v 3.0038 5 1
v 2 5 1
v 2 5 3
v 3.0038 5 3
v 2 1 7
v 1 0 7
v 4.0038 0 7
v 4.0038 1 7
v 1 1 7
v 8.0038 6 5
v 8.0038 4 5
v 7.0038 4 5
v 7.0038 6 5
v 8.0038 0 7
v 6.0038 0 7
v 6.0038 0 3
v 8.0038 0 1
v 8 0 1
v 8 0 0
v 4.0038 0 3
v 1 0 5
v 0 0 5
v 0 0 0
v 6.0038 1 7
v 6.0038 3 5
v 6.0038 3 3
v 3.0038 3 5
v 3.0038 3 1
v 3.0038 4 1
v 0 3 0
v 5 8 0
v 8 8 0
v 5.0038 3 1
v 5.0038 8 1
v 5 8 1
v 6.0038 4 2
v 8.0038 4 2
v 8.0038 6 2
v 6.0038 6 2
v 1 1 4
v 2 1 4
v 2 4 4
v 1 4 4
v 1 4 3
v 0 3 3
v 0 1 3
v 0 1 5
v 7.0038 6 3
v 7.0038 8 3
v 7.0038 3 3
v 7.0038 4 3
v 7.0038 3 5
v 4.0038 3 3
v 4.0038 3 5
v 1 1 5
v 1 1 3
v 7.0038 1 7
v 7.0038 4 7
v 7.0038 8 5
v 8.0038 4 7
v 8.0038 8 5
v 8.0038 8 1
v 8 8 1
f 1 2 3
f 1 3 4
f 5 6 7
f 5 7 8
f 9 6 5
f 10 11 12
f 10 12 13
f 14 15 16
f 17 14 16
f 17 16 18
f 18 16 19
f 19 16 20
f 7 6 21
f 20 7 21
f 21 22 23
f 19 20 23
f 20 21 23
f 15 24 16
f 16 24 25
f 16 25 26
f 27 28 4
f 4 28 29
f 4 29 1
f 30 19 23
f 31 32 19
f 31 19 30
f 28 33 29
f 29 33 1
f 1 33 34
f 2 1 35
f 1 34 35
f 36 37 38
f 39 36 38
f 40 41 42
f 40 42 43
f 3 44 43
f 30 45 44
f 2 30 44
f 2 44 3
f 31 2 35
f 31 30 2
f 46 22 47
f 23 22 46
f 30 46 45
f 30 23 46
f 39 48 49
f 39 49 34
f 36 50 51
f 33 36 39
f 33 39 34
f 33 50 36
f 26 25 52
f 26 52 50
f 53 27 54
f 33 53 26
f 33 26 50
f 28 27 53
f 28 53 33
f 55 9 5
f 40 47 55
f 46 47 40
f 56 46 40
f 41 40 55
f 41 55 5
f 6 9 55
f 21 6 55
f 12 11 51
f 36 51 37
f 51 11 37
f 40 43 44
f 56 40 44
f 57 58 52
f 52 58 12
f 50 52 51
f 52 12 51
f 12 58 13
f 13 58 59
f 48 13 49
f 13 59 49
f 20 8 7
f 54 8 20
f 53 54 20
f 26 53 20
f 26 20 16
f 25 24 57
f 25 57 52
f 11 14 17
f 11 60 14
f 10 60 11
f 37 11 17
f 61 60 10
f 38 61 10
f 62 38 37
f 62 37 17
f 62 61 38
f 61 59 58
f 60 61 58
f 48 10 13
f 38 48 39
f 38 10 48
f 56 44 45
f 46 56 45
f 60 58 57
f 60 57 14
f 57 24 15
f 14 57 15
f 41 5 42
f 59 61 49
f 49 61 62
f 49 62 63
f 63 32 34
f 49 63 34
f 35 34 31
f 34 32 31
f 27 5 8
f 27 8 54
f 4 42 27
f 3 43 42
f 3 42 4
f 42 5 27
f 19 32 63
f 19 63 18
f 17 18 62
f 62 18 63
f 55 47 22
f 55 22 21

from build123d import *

# Parameters (mm, degrees)
BOSS_EXTRUDE1_DEPTH = 1
BOSS_EXTRUDE2_DEPTH = 6
CUT_EXTRUDE1_DEPTH  = 4
CUT_EXTRUDE2_DEPTH  = 4
SKETCH6_W           = 1
SKETCH6_H           = 2
CUT_EXTRUDE3_DEPTH  = 4
BOSS_EXTRUDE3_DEPTH = 4
SKETCH8_W           = 2
SKETCH8_H           = 4
CUT_EXTRUDE4_DEPTH  = 4
BOSS_EXTRUDE4_DEPTH = 1
SKETCH14_W          = 4.502969787
SKETCH14_H          = 1
CUT_EXTRUDE6_DEPTH  = 4
SKETCH11_W          = 3
SKETCH11_H          = 2
CUT_EXTRUDE5_DEPTH  = 2
BOSS_EXTRUDE5_DEPTH = 5
SKETCH16_W          = 1
SKETCH16_H          = 2
CUT_EXTRUDE7_DEPTH  = 3


with BuildPart() as part:
    # Sketch2 → Boss-Extrude1 (new body)
    with BuildSketch(Plane.XY):
        Polygon((0, 0), (0, 3), (5, 8), (8, 8), (8, 0), align=None)
    extrude(amount=BOSS_EXTRUDE1_DEPTH)

    # Sketch3 → Boss-Extrude2 (add)
    with BuildSketch(Plane.XY.offset(1)):
        Polygon((0, 0), (0, 3), (2, 5), (3.00380266, 5), (3.00380266, 3), (3.00380266, 0), align=None)
    extrude(amount=BOSS_EXTRUDE2_DEPTH)

    # Sketch4 → Cut-Extrude1 (cut)
    with BuildSketch(Plane.ZY):
        Polygon((3, 5), (7, 1), (7, 5), align=None)
    extrude(amount=-CUT_EXTRUDE1_DEPTH, mode=Mode.SUBTRACT)

    # Sketch5 → Cut-Extrude2 (cut)
    with BuildSketch(Plane(origin=(0, 5, 0), x_dir=(1, 0, 0), z_dir=(0, 1, 0))):
        Polygon((1, -4), (1, -3), (0, -3), (0, -3.75), (0, -7), (2, -7), (2, -4), align=None)
    extrude(amount=-CUT_EXTRUDE2_DEPTH, mode=Mode.SUBTRACT)

    # Sketch6 → Cut-Extrude3 (cut)
    with BuildSketch(Plane(origin=(0, 1, 0), x_dir=(1, 0, 0), z_dir=(0, 1, 0))):
        with Locations((0.5, -6)):
            Rectangle(SKETCH6_W, SKETCH6_H)
    extrude(amount=-CUT_EXTRUDE3_DEPTH, mode=Mode.SUBTRACT)

    # Sketch7 → Boss-Extrude3 (add)
    with BuildSketch(Plane(origin=(3.00380266, 0, 0), x_dir=(0, 0, -1), z_dir=(1, 0, 0))):
        Polygon((-7, 0), (-7, 1), (-4, 4), (-1, 4), (-1, 0), align=None)
    extrude(amount=BOSS_EXTRUDE3_DEPTH)

    # Sketch8 → Cut-Extrude4 (cut)
    with BuildSketch(Plane(origin=(0, 4, 0), x_dir=(1, 0, 0), z_dir=(0, 1, 0))):
        with Locations((5.00380266, -5)):
            Rectangle(SKETCH8_W, SKETCH8_H)
    extrude(amount=-CUT_EXTRUDE4_DEPTH, mode=Mode.SUBTRACT)

    # Sketch9 → Boss-Extrude4 (add)
    with BuildSketch(Plane(origin=(7.00380266, 0, 0), x_dir=(0, 0, -1), z_dir=(1, 0, 0))):
        Polygon((-7, 0), (-1, 0), (-1, 8), (-5, 8), (-7, 4), align=None)
    extrude(amount=BOSS_EXTRUDE4_DEPTH)

    # Sketch14 → Cut-Extrude6 (cut)
    with BuildSketch(Plane(origin=(3.00380266, 0, 0), x_dir=(0, 0, -1), z_dir=(1, 0, 0))):
        with Locations((-3.251484894, 3.5)):
            Rectangle(SKETCH14_W, SKETCH14_H)
    extrude(amount=CUT_EXTRUDE6_DEPTH, mode=Mode.SUBTRACT)

    # Sketch11 → Cut-Extrude5 (cut)
    with BuildSketch(Plane(origin=(8.00380266, 0, 0), x_dir=(0, 0, -1), z_dir=(1, 0, 0))):
        with Locations((-3.5, 5)):
            Rectangle(SKETCH11_W, SKETCH11_H)
    extrude(amount=-CUT_EXTRUDE5_DEPTH, mode=Mode.SUBTRACT)

    # Sketch15 → Boss-Extrude5 (add)
    with BuildSketch(Plane(origin=(0, 3, 0), x_dir=(1, 0, 0), z_dir=(0, 1, 0))):
        Polygon((7.00380266, -3), (5.00380266, -1), (7.00380266, -1), align=None)
    extrude(amount=BOSS_EXTRUDE5_DEPTH)

    # Sketch16 → Cut-Extrude7 (cut)
    with BuildSketch(Plane(origin=(7.00380266, 0, 0), x_dir=(0, 0, -1), z_dir=(1, 0, 0))):
        with Locations((-2.5, 5)):
            Rectangle(SKETCH16_W, SKETCH16_H)
    extrude(amount=-CUT_EXTRUDE7_DEPTH, mode=Mode.SUBTRACT)


solid = part.part
